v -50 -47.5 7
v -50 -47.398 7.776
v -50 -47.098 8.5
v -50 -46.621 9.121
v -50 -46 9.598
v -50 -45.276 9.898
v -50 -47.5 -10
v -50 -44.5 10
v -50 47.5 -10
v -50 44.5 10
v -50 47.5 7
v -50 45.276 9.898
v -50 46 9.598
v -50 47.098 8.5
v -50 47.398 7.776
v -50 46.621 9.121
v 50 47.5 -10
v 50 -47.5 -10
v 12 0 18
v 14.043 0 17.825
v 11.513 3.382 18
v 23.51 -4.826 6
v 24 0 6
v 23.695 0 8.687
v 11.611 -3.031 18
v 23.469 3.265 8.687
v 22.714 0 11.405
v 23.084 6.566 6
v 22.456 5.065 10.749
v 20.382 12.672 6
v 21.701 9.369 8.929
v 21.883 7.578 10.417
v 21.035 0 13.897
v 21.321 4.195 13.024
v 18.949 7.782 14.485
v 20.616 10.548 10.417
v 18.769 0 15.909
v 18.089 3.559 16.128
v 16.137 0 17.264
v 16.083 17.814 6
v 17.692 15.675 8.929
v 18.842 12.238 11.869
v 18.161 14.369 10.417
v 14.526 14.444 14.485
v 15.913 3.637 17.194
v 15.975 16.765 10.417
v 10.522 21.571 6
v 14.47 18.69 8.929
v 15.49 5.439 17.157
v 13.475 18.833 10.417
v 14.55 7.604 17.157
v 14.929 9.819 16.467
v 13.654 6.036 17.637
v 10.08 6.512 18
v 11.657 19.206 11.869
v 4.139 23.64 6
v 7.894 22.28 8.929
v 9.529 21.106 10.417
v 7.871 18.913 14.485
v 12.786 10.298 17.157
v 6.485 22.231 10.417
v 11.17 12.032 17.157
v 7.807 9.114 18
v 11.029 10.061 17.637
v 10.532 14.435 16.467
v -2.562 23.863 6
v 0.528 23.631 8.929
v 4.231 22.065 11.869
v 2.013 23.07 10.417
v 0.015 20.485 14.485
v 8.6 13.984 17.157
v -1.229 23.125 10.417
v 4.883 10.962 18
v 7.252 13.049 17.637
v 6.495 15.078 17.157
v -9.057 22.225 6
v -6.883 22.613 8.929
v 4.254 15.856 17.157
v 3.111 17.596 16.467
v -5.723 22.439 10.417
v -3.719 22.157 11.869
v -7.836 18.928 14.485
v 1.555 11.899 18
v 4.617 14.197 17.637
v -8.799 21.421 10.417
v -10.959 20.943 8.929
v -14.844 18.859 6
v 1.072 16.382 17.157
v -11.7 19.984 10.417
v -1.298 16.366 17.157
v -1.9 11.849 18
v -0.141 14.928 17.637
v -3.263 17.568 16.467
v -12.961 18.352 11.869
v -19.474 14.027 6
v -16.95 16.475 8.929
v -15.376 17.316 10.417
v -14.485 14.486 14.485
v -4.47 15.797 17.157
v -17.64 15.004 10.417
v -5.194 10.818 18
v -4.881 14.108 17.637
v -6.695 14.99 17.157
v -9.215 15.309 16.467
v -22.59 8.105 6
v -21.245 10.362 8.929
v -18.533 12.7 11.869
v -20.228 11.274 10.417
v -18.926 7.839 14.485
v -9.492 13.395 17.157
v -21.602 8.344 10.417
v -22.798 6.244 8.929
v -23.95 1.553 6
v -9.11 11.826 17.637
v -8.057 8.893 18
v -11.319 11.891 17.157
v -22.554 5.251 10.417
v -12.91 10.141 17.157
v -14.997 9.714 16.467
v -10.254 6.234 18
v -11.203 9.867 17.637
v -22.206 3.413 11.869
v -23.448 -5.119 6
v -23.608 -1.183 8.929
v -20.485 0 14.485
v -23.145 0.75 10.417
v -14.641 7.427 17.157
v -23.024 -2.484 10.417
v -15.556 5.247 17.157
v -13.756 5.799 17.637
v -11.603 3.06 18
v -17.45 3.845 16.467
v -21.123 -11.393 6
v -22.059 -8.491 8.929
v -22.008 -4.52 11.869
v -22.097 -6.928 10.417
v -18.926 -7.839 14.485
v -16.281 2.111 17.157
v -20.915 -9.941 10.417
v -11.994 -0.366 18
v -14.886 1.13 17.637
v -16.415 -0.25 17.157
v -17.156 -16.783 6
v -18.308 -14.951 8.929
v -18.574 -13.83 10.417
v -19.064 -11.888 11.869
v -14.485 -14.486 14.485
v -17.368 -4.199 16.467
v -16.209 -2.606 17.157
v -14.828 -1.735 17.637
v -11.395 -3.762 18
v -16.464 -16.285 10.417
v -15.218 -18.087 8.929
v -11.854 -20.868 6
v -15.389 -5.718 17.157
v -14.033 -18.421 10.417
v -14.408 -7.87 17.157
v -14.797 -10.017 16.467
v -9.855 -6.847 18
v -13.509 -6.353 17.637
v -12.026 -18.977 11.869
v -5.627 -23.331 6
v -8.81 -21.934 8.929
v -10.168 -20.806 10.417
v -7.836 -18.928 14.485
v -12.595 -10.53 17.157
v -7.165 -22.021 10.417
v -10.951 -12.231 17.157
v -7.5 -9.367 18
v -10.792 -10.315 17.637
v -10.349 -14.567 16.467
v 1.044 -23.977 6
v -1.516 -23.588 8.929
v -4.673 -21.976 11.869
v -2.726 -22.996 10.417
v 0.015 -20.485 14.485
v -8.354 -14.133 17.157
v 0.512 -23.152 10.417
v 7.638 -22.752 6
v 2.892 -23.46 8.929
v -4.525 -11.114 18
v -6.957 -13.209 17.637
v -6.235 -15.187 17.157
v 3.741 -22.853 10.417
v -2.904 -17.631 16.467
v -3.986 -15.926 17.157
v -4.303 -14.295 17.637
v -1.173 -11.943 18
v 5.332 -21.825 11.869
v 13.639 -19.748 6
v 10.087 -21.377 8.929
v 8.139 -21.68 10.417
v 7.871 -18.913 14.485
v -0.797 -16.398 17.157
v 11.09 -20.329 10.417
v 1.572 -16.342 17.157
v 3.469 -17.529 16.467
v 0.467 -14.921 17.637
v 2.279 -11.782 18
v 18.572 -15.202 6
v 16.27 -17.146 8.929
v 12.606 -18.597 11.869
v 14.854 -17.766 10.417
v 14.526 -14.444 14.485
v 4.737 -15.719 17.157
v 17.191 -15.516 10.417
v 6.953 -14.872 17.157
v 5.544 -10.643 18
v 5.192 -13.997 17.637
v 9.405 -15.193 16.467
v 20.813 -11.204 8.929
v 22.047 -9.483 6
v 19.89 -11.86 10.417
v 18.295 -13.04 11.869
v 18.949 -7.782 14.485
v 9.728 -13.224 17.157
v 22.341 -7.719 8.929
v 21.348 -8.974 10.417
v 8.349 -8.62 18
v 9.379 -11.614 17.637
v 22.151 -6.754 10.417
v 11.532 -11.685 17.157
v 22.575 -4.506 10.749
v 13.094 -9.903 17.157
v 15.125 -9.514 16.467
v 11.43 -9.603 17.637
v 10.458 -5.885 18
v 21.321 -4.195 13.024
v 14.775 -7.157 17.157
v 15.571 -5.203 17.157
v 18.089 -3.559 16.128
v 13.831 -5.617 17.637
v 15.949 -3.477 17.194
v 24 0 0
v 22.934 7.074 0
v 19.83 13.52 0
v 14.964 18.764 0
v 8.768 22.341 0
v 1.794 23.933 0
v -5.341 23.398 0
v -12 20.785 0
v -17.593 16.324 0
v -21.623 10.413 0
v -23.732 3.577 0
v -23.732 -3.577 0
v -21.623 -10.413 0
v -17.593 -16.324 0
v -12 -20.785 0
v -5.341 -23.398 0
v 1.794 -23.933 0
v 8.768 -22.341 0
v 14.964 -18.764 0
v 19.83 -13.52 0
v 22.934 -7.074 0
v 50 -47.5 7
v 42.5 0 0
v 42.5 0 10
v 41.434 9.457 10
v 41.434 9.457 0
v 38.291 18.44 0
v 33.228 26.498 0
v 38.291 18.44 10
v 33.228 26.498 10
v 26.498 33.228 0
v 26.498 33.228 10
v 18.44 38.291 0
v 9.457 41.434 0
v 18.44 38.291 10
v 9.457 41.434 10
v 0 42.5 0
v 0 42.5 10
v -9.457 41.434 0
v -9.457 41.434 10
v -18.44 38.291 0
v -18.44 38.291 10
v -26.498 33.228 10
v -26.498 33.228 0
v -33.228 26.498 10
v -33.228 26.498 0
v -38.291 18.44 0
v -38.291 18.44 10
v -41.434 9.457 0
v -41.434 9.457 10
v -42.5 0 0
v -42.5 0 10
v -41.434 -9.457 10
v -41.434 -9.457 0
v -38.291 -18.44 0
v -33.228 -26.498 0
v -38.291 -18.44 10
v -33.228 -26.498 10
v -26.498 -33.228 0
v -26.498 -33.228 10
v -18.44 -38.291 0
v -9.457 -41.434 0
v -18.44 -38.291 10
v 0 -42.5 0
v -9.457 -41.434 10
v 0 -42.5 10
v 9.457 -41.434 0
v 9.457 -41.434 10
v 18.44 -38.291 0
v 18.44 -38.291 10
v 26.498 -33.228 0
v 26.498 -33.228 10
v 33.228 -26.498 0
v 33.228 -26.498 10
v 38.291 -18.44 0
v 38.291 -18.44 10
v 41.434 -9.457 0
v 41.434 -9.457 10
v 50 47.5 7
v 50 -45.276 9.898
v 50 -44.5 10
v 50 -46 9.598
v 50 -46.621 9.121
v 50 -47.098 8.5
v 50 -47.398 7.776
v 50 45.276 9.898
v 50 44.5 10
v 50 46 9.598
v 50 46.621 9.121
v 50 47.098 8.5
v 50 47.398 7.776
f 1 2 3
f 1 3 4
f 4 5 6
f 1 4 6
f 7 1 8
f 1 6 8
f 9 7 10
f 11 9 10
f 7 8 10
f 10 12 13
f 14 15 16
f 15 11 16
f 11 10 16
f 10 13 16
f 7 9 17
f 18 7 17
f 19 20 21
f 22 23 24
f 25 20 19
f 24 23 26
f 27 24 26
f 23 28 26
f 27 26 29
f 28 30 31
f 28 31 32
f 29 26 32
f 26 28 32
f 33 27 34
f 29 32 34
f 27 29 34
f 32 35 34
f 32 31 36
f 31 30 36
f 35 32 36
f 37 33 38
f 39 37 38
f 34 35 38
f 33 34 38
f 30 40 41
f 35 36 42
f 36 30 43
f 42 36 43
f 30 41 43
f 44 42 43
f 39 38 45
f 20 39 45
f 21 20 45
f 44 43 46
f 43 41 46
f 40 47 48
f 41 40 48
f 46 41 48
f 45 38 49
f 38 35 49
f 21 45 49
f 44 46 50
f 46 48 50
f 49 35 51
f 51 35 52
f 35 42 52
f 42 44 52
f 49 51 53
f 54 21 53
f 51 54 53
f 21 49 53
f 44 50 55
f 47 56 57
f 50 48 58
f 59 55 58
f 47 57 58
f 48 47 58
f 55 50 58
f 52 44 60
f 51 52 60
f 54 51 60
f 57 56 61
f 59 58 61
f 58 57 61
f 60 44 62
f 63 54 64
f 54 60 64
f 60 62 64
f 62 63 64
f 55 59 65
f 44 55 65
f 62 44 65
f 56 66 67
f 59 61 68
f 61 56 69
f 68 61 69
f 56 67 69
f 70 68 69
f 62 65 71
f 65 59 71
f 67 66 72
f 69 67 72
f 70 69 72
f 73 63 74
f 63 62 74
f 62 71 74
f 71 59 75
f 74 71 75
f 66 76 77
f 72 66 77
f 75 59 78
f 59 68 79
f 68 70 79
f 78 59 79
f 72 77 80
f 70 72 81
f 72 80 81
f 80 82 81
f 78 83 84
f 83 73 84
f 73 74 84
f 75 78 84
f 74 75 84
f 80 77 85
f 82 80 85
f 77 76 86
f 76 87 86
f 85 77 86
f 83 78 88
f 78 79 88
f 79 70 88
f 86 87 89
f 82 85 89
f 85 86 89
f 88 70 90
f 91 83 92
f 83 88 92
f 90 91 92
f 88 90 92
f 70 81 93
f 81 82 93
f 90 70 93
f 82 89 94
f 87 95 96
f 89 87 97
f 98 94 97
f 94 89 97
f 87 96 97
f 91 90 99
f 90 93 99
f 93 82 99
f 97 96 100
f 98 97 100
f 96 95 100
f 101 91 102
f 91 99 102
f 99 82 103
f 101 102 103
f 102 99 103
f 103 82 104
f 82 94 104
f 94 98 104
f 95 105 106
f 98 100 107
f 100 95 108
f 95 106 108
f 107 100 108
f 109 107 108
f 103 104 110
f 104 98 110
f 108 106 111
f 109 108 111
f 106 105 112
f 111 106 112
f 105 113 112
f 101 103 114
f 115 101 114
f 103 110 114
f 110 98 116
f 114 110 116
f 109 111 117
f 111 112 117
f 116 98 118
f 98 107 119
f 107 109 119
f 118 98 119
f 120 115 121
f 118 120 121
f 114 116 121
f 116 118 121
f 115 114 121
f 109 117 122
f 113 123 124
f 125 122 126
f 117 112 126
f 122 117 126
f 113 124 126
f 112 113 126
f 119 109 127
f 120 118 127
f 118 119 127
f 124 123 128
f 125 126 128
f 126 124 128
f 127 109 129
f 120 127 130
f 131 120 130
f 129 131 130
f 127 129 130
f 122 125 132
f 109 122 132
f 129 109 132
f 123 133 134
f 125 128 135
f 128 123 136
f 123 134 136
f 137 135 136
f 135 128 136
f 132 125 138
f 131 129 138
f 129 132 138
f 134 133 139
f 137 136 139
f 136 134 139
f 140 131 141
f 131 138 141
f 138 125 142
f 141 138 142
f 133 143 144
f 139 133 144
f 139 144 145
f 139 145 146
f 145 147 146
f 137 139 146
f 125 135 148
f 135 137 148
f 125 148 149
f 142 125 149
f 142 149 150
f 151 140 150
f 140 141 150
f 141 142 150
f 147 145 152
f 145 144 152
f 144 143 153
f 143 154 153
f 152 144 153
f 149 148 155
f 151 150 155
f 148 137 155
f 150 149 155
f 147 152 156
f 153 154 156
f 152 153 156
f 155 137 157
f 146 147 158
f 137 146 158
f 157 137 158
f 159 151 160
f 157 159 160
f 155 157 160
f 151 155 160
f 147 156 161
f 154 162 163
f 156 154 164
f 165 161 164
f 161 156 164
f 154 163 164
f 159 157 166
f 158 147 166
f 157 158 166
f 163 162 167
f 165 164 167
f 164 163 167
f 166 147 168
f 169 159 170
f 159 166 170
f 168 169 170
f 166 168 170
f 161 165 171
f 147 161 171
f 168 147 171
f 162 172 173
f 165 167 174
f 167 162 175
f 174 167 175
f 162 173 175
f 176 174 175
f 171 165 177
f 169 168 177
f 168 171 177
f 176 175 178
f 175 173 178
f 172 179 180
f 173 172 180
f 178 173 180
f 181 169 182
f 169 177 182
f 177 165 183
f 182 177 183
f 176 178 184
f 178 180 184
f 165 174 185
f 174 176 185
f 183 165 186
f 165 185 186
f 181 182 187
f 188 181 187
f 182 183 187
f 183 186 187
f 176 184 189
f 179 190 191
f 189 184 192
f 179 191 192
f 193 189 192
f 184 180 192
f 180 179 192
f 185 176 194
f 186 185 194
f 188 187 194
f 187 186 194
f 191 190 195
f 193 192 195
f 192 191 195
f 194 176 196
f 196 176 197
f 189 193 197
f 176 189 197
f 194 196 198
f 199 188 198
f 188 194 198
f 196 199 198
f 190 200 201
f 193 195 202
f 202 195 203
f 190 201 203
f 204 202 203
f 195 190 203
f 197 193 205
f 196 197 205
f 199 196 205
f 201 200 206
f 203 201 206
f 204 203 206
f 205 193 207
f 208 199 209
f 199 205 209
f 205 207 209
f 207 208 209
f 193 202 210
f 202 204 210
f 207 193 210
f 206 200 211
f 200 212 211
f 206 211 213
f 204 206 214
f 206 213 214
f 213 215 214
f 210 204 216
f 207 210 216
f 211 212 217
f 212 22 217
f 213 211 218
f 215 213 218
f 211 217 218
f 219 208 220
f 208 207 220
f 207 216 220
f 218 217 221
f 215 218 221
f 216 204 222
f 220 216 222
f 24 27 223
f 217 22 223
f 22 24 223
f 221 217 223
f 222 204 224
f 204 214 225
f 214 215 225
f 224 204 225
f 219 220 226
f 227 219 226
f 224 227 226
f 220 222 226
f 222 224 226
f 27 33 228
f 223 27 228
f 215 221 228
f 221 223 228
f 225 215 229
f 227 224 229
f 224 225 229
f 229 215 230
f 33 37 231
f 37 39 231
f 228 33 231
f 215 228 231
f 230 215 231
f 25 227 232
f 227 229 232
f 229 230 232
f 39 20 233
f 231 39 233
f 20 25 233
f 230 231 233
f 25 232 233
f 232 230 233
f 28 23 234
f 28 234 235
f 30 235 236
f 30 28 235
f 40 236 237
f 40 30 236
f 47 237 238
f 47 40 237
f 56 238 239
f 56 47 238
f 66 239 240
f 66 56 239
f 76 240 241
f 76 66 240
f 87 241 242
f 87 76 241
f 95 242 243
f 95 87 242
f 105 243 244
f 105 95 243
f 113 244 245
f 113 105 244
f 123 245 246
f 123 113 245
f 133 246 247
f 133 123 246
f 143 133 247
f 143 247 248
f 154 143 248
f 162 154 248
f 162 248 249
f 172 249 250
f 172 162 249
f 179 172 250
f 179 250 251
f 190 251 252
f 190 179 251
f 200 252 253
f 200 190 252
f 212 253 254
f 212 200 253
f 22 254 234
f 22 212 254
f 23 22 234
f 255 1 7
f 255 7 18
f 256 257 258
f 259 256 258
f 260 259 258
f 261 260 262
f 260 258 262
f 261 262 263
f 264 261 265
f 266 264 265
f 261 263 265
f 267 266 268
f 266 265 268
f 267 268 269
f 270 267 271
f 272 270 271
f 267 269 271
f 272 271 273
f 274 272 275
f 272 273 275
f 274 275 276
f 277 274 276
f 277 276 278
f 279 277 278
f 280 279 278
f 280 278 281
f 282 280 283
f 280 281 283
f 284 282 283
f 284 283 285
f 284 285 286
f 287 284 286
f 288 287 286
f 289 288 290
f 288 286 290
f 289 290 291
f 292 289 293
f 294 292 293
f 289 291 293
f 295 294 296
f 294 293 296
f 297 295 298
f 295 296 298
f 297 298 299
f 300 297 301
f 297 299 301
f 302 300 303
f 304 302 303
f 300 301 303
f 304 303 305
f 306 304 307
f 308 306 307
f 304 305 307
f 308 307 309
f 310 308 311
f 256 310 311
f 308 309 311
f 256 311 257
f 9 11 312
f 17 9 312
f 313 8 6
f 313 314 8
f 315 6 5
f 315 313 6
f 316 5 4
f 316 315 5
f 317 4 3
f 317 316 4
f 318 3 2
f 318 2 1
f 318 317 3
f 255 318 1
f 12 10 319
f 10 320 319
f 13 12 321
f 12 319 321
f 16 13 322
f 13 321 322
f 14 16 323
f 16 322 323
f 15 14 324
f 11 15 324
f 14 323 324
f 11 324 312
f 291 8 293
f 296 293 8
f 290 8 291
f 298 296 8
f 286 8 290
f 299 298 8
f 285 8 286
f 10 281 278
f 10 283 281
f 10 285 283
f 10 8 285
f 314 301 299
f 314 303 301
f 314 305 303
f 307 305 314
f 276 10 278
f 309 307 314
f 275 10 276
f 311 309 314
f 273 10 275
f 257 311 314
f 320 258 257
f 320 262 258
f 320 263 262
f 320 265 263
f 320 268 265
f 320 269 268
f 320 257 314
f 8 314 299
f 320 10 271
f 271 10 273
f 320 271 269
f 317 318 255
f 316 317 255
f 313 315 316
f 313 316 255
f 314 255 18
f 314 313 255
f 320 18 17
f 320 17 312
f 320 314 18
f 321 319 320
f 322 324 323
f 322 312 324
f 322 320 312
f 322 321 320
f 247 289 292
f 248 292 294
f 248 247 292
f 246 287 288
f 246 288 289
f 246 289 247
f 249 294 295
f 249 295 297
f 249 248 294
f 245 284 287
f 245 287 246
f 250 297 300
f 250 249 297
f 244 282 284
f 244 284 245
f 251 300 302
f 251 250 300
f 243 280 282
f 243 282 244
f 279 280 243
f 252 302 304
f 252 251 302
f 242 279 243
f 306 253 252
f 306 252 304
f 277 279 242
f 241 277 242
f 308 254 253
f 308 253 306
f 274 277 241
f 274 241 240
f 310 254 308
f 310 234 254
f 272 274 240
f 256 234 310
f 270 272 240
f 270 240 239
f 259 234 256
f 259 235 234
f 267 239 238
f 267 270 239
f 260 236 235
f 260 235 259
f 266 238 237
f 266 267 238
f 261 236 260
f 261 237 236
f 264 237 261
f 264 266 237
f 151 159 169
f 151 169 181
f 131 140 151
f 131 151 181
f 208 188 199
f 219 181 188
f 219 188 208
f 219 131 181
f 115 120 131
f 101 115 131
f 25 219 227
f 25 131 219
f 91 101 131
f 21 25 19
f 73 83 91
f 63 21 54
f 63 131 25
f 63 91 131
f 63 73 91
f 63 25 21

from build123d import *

# Parameters (mm, degrees)
F0_W     = 100
F0_H     = 95
F1_DEPTH = 10
F2_R     = 42.5
F2_R_2   = 24
F3_DEPTH = 10
F4_R     = 24
F4_R_2   = 14
F5_DEPTH = 8
F6_R     = 12
F7_R     = 3


with BuildPart() as f1:
    # F0 (on Top) → F1 (new body, symmetric)
    with BuildSketch(Plane.XY):
        Rectangle(F0_W, F0_H)
    extrude(amount=F1_DEPTH, both=True)

    # F2 (on face) → F3 (cut)
    with BuildSketch(Plane.XY.offset(10)):
        Circle(F2_R)
        Circle(F2_R_2, mode=Mode.SUBTRACT)
    extrude(amount=-F3_DEPTH, mode=Mode.SUBTRACT)

    # F4 (on face) → F5 (join)
    with BuildSketch(Plane.XY.offset(10)):
        Circle(F4_R)
        Circle(F4_R_2, mode=Mode.SUBTRACT)
        Circle(F4_R_2)
    extrude(amount=F5_DEPTH)

    # F6
    f6_edges = [f1.edges().sort_by_distance(p)[0] for p in [
        (-24, 0, 18),
    ]]
    fillet(f6_edges, radius=F6_R)

    # F7
    f7_edges = [f1.edges().sort_by_distance(p)[0] for p in [
        (0, 47.5, 10),
        (0, -47.5, 10),
    ]]
    fillet(f7_edges, radius=F7_R)


solid = f1.part
